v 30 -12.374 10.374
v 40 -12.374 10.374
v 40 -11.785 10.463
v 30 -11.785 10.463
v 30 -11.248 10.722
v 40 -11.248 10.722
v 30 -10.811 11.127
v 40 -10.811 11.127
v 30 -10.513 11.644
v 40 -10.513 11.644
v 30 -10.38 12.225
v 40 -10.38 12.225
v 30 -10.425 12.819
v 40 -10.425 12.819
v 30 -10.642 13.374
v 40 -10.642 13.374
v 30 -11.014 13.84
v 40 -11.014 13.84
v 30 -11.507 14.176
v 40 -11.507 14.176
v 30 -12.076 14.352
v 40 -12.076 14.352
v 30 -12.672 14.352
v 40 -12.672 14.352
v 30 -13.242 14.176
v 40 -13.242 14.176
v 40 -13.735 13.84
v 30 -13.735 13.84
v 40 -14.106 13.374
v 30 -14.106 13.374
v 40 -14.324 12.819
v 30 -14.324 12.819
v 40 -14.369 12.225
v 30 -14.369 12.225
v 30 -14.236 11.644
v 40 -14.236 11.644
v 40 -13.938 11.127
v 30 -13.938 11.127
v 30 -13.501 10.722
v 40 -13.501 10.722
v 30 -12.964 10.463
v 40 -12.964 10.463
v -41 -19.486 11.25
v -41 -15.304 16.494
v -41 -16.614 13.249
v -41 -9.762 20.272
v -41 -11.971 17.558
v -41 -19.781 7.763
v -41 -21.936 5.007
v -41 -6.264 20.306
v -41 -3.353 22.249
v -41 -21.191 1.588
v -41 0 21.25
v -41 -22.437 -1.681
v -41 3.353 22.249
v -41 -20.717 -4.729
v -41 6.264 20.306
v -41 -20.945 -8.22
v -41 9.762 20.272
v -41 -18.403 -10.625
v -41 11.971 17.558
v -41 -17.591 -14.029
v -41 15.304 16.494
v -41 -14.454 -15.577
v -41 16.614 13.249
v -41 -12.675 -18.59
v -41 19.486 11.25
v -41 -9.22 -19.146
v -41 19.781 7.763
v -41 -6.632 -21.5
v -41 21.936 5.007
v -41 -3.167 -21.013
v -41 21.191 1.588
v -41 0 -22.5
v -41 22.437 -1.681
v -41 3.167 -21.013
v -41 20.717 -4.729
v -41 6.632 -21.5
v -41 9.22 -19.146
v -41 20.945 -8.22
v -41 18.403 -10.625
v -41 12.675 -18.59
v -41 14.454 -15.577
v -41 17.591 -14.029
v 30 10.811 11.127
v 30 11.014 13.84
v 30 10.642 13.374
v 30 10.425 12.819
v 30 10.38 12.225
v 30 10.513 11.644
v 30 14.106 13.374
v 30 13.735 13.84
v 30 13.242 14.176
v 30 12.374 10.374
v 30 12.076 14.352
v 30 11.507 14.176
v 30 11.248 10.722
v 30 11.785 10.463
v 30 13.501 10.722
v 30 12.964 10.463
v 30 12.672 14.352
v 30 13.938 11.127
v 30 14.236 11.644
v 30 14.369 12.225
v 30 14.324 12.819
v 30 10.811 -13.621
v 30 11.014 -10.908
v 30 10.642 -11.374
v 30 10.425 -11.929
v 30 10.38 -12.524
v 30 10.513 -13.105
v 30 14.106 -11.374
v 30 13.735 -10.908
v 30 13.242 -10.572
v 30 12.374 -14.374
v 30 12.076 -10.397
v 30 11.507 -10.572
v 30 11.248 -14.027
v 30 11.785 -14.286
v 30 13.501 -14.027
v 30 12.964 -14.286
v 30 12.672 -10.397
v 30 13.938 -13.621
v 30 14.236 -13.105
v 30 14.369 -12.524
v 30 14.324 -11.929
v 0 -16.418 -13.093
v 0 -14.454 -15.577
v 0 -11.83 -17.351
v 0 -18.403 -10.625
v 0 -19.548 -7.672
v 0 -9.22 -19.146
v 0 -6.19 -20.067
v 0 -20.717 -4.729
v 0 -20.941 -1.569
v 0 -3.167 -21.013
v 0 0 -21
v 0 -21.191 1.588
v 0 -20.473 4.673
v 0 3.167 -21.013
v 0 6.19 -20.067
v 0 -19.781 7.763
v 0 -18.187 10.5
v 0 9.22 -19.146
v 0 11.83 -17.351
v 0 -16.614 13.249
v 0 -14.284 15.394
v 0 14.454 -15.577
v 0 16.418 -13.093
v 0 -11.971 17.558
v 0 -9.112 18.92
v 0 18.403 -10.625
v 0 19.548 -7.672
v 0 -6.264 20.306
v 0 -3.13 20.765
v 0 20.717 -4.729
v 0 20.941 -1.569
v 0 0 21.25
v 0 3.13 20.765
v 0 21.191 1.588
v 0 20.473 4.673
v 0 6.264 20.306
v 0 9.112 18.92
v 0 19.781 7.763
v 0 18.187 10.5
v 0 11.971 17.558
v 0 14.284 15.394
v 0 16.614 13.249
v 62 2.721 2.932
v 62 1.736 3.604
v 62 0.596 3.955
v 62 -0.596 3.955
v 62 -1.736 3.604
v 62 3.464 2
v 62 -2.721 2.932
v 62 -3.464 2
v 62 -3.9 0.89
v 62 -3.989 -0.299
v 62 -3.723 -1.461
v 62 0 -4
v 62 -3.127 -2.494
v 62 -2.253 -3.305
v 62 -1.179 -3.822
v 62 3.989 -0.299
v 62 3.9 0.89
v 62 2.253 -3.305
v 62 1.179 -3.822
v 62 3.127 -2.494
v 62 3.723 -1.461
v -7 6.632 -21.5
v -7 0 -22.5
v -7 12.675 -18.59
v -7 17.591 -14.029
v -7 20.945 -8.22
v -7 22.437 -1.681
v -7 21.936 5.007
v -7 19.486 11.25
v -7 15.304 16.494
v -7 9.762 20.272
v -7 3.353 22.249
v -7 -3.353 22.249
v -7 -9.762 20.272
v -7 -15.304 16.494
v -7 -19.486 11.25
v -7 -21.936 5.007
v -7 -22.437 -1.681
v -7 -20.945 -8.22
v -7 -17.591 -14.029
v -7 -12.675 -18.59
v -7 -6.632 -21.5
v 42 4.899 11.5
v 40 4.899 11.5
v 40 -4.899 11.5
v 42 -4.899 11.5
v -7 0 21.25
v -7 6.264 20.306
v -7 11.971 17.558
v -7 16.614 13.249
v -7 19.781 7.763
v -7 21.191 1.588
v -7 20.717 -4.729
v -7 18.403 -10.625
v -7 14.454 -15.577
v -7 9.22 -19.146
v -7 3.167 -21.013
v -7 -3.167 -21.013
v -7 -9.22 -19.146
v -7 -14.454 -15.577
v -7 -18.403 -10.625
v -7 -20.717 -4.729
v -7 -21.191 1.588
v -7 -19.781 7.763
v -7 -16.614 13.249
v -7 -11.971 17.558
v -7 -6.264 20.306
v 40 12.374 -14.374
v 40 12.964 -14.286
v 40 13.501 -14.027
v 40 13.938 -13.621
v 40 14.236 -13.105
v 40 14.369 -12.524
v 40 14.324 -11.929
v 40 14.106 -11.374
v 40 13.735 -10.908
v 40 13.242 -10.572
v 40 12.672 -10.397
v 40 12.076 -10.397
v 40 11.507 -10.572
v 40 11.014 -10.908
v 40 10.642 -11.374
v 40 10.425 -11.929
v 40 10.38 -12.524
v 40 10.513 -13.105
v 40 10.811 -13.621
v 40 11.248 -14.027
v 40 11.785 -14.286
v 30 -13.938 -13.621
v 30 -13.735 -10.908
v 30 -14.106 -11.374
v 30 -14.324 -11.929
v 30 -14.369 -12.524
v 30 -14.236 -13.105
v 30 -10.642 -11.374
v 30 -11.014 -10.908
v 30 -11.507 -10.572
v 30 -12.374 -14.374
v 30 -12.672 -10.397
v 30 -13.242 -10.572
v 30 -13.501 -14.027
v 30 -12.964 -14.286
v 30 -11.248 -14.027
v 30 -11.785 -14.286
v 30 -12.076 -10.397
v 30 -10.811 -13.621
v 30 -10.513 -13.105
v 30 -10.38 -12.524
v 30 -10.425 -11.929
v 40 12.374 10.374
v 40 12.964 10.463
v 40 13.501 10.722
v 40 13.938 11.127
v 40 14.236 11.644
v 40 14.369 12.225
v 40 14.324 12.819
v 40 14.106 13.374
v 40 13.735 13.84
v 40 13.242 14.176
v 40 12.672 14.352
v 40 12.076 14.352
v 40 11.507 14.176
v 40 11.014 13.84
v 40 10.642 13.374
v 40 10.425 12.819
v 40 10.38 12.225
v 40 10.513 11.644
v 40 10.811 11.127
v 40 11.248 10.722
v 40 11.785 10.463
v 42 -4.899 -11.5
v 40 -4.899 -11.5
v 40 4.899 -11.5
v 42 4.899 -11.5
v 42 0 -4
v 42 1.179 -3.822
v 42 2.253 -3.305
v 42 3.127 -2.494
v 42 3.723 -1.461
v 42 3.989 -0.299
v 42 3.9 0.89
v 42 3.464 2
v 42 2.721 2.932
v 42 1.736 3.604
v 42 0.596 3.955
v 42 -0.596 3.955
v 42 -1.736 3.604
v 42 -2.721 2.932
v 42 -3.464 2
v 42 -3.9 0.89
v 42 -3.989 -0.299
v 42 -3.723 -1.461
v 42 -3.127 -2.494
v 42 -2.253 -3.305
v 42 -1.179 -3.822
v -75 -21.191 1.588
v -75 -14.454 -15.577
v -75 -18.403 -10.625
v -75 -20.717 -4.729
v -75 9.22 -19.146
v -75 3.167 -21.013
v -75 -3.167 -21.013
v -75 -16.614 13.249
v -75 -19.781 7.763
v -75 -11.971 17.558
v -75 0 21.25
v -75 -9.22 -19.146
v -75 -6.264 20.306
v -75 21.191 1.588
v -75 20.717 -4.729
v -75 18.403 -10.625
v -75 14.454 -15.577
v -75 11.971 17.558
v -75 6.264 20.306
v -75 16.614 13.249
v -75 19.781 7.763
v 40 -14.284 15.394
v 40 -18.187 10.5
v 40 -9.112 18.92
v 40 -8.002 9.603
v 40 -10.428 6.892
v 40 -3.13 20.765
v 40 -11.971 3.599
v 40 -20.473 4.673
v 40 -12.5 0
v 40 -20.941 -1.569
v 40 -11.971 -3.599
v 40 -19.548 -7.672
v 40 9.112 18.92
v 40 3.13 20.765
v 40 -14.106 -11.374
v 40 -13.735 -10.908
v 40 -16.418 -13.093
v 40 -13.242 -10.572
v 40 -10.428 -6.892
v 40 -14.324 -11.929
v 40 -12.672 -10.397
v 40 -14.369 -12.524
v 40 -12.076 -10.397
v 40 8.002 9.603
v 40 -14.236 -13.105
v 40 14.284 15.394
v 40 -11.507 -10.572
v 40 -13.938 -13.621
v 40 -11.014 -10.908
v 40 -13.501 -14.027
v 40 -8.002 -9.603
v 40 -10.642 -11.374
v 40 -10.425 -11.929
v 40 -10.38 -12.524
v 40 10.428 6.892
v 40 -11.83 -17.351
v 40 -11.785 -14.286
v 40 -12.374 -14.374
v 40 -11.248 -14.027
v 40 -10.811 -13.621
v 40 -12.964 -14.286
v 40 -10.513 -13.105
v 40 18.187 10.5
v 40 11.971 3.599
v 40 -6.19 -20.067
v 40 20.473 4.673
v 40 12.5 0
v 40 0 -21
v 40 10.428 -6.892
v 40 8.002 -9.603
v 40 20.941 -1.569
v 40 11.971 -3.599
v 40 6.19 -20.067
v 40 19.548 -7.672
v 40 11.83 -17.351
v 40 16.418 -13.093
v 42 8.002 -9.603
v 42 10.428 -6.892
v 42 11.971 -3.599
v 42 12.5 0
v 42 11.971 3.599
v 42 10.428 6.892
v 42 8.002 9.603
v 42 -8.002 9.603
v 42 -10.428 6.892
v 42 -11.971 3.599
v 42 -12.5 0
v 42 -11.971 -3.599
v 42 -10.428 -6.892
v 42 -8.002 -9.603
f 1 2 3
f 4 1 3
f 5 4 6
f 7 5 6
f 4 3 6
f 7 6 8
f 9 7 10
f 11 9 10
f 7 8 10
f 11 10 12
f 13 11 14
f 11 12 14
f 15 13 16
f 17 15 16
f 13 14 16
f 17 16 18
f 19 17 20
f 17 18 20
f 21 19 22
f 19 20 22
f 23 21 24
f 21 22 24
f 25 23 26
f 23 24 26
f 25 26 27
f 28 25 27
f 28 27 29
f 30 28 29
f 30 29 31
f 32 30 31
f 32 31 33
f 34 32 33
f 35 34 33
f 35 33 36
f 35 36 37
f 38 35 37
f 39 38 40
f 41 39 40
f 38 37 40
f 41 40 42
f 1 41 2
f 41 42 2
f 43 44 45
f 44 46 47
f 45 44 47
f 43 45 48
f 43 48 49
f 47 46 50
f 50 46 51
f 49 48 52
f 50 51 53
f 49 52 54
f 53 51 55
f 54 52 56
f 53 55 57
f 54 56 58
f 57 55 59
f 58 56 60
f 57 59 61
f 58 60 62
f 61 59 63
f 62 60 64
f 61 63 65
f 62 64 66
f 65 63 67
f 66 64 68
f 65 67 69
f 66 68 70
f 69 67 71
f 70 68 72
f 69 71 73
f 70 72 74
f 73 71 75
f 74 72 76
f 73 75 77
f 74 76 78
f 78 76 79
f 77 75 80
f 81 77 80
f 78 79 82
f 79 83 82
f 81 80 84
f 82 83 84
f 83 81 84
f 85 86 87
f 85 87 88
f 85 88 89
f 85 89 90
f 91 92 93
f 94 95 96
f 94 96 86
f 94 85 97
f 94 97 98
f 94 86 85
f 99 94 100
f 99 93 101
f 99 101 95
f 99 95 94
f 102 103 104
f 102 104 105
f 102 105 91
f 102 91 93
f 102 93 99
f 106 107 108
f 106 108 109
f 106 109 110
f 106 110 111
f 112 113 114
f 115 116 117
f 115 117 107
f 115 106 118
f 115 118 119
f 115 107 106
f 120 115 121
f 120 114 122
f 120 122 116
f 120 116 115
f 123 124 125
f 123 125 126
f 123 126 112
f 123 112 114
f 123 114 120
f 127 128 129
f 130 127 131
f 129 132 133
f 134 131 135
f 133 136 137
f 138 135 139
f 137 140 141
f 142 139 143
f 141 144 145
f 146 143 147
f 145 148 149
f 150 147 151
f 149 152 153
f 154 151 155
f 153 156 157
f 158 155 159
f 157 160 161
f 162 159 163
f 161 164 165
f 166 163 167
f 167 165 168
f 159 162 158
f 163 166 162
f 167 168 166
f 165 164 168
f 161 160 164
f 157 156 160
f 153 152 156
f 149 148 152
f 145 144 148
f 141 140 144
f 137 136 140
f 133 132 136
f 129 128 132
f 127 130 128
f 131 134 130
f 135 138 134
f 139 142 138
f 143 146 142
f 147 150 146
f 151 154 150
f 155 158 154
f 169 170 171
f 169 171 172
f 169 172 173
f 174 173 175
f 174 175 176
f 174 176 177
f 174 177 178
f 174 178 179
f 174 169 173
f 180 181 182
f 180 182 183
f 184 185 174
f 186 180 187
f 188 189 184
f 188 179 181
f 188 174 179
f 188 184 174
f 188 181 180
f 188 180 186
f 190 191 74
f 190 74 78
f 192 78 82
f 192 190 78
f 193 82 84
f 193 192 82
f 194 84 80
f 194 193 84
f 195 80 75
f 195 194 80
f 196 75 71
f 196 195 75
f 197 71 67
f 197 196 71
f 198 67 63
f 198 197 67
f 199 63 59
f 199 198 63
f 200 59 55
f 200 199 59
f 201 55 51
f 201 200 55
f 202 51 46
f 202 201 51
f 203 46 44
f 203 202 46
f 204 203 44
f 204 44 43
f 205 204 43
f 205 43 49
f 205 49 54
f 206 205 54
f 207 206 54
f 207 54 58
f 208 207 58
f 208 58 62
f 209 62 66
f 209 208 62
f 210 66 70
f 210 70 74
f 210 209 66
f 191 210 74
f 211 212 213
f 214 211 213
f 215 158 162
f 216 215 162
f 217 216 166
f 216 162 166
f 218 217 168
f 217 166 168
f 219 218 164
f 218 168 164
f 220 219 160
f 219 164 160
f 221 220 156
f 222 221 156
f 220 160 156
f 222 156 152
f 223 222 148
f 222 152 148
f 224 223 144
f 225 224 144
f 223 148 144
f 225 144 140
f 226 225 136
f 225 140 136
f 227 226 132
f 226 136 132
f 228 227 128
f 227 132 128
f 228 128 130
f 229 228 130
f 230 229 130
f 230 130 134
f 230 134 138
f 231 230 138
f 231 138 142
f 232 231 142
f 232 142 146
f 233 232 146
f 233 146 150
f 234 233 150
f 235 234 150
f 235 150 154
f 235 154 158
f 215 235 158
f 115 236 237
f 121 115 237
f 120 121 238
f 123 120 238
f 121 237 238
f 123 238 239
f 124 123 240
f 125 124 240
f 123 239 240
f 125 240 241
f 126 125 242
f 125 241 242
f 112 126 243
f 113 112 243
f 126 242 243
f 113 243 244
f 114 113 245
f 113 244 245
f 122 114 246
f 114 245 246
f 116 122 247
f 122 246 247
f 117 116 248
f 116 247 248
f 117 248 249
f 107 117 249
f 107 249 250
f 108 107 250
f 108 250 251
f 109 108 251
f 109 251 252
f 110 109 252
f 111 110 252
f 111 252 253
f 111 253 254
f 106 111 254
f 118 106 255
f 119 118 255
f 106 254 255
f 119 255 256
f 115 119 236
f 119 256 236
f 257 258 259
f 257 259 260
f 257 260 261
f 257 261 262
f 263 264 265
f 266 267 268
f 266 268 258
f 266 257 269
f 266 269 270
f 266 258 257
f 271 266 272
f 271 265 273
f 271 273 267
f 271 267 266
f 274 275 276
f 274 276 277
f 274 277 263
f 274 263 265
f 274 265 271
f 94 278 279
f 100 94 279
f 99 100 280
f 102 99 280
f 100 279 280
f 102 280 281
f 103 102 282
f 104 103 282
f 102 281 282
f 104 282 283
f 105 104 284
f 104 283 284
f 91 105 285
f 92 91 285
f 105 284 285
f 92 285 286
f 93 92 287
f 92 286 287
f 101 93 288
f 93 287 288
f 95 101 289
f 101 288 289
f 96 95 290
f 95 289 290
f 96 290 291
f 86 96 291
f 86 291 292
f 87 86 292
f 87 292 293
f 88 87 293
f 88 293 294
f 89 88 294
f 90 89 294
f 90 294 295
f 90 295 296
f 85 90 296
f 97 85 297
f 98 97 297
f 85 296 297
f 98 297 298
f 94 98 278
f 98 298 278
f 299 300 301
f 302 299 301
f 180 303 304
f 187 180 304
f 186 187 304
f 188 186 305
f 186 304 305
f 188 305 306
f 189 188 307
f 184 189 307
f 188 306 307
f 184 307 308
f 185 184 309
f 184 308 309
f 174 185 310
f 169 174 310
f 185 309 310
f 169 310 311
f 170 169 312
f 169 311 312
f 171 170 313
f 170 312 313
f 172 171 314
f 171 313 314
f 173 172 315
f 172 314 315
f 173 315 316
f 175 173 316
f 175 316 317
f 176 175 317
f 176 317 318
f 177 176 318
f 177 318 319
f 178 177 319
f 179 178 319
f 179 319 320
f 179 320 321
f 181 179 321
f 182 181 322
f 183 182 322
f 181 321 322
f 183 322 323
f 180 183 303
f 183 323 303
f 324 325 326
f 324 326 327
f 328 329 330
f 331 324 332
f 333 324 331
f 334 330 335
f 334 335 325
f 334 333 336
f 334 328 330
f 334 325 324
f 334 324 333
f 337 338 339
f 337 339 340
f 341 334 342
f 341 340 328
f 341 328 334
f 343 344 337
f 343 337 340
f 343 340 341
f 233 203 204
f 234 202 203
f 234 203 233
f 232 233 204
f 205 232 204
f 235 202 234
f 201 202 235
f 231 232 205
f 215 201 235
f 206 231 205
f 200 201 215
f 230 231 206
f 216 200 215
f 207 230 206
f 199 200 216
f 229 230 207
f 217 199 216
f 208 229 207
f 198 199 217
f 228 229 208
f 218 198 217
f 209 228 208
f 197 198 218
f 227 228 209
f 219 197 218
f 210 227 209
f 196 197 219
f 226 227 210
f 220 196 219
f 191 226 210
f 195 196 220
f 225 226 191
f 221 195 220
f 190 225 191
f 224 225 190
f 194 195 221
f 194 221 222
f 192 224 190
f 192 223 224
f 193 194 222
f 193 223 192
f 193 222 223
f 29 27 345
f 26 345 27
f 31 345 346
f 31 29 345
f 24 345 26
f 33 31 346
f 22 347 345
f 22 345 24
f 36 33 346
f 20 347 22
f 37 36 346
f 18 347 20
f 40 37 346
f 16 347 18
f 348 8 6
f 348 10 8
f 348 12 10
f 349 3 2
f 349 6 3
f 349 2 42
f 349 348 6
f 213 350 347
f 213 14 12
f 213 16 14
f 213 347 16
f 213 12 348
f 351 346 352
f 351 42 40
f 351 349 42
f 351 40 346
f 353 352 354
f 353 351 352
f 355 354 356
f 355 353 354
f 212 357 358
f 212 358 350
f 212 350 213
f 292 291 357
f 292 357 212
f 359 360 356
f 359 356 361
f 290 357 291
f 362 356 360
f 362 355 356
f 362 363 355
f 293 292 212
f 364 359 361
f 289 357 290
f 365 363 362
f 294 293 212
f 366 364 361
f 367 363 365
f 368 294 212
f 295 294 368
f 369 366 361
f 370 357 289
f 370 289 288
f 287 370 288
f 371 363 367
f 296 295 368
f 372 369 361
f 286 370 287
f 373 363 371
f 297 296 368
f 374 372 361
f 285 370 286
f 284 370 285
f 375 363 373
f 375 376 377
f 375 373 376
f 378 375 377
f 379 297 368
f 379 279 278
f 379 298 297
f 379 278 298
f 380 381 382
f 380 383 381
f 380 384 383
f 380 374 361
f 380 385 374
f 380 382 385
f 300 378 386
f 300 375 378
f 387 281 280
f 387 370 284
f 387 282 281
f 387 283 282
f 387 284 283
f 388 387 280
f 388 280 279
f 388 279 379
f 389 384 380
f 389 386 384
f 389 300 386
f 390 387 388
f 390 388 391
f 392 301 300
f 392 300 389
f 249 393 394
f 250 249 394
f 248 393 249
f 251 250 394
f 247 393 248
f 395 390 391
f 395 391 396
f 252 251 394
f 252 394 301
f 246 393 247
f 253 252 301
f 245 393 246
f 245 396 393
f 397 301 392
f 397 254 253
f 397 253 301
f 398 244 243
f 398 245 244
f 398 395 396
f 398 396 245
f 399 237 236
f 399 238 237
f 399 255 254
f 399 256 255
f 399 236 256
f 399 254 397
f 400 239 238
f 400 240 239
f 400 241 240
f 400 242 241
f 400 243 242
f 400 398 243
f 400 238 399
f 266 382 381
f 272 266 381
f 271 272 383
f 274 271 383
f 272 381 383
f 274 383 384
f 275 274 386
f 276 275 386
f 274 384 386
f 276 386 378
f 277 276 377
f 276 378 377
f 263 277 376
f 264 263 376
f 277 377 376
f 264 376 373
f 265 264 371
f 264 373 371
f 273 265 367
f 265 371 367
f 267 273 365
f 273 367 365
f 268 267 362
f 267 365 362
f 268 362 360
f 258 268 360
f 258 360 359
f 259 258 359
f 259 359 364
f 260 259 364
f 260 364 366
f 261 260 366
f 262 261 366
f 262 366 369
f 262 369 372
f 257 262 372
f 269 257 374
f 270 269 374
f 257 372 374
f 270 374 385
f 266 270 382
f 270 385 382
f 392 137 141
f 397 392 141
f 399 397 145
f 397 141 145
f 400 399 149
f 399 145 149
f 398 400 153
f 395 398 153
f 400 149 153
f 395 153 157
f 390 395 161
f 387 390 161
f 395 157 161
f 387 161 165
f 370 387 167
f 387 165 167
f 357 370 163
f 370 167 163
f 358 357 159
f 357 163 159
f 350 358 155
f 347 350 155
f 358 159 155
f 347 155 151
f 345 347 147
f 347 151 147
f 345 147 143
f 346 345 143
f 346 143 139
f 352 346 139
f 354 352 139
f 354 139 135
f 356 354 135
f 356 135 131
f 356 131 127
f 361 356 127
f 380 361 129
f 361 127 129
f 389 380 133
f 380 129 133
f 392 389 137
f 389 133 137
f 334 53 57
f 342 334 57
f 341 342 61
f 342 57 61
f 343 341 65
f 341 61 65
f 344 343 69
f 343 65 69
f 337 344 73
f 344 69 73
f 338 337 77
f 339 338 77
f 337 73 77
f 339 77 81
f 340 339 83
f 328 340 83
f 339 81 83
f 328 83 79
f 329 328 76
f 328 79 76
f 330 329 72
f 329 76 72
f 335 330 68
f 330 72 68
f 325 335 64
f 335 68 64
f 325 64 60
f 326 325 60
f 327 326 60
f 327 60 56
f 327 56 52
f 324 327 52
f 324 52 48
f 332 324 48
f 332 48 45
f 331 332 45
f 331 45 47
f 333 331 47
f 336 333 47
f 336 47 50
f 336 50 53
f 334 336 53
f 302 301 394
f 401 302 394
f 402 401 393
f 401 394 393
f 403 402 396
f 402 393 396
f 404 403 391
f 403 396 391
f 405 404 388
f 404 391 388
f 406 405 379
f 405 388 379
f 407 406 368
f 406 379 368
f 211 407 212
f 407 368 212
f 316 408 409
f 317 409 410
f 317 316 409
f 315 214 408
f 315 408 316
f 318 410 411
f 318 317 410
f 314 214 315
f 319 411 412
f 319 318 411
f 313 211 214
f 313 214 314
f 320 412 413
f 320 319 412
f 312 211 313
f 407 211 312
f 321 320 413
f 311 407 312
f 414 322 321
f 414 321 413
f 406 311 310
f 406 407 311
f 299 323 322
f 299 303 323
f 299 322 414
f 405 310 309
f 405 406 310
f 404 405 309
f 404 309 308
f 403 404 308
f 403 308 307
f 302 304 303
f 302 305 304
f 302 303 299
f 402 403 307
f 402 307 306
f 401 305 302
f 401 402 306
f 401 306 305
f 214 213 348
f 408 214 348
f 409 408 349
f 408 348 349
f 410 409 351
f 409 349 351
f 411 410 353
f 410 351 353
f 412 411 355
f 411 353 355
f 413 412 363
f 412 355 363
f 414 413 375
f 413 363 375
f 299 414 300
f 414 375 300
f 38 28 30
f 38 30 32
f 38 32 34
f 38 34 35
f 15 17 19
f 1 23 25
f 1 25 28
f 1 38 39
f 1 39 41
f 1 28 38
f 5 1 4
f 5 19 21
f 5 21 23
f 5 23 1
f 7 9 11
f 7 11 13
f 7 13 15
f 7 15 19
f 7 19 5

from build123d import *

# Parameters (mm, degrees)
SKETCH1_R           = 21
BOSS_EXTRUDE1_DEPTH = 40
BOSS_EXTRUDE2_DEPTH = 2
SKETCH3_R           = 4
BOSS_EXTRUDE3_DEPTH = 20
SKETCH4_R           = 2
CUT_EXTRUDE1_DEPTH  = 10
SKETCH5_R           = 21.25
BOSS_EXTRUDE4_DEPTH = 75
SKETCH6_R           = 22.5
SKETCH6_R_2         = 21.25
BOSS_EXTRUDE5_DEPTH = 34


with BuildPart() as part:
    # Sketch1 → Boss-Extrude1 (new body)
    with BuildSketch(Plane(origin=(0, 0, 0), x_dir=(0, 0, -1), z_dir=(1, 0, 0))):
        Circle(SKETCH1_R)
    extrude(amount=BOSS_EXTRUDE1_DEPTH)

    # Sketch2 → Boss-Extrude2 (add)
    with BuildSketch(Plane(origin=(40, 0, 0), x_dir=(0, 0, -1), z_dir=(1, 0, 0))):
        with BuildLine():
            Line((-11.5, 4.898979486), (-11.5, -4.898979486))
            ThreePointArc((-11.5, -4.898979486), (0, -12.5), (11.5, -4.898979486))
            Line((11.5, -4.898979486), (11.5, 4.898979486))
            ThreePointArc((11.5, 4.898979486), (0, 12.5), (-11.5, 4.898979486))
        make_face()
    extrude(amount=BOSS_EXTRUDE2_DEPTH)

    # Sketch3 → Boss-Extrude3 (add)
    with BuildSketch(Plane(origin=(42, 0, 0), x_dir=(0, 0, -1), z_dir=(1, 0, 0))):
        Circle(SKETCH3_R)
    extrude(amount=BOSS_EXTRUDE3_DEPTH)

    # Sketch4 → Cut-Extrude1 (cut)
    with BuildSketch(Plane(origin=(40, 0, 0), x_dir=(0, 0, -1), z_dir=(1, 0, 0))):
        with Locations((-12.374368671, 12.374368671)):
            Circle(SKETCH4_R)
        with Locations((12.374368671, 12.374368671)):
            Circle(SKETCH4_R)
        with Locations((12.374368671, -12.374368671)):
            Circle(SKETCH4_R)
        with Locations((-12.374368671, -12.374368671)):
            Circle(SKETCH4_R)
    extrude(amount=-CUT_EXTRUDE1_DEPTH, mode=Mode.SUBTRACT)

    # Sketch5 → Boss-Extrude4 (add)
    with BuildSketch(Plane.ZY):
        Circle(SKETCH5_R)
    extrude(amount=BOSS_EXTRUDE4_DEPTH)

    # Sketch6 → Boss-Extrude5 (add)
    with BuildSketch(Plane(origin=(-7, 0, 0), x_dir=(0, 0, -1), z_dir=(1, 0, 0))):
        Circle(SKETCH6_R)
        Circle(SKETCH6_R_2, mode=Mode.SUBTRACT)
    extrude(amount=-BOSS_EXTRUDE5_DEPTH)


solid = part.part
